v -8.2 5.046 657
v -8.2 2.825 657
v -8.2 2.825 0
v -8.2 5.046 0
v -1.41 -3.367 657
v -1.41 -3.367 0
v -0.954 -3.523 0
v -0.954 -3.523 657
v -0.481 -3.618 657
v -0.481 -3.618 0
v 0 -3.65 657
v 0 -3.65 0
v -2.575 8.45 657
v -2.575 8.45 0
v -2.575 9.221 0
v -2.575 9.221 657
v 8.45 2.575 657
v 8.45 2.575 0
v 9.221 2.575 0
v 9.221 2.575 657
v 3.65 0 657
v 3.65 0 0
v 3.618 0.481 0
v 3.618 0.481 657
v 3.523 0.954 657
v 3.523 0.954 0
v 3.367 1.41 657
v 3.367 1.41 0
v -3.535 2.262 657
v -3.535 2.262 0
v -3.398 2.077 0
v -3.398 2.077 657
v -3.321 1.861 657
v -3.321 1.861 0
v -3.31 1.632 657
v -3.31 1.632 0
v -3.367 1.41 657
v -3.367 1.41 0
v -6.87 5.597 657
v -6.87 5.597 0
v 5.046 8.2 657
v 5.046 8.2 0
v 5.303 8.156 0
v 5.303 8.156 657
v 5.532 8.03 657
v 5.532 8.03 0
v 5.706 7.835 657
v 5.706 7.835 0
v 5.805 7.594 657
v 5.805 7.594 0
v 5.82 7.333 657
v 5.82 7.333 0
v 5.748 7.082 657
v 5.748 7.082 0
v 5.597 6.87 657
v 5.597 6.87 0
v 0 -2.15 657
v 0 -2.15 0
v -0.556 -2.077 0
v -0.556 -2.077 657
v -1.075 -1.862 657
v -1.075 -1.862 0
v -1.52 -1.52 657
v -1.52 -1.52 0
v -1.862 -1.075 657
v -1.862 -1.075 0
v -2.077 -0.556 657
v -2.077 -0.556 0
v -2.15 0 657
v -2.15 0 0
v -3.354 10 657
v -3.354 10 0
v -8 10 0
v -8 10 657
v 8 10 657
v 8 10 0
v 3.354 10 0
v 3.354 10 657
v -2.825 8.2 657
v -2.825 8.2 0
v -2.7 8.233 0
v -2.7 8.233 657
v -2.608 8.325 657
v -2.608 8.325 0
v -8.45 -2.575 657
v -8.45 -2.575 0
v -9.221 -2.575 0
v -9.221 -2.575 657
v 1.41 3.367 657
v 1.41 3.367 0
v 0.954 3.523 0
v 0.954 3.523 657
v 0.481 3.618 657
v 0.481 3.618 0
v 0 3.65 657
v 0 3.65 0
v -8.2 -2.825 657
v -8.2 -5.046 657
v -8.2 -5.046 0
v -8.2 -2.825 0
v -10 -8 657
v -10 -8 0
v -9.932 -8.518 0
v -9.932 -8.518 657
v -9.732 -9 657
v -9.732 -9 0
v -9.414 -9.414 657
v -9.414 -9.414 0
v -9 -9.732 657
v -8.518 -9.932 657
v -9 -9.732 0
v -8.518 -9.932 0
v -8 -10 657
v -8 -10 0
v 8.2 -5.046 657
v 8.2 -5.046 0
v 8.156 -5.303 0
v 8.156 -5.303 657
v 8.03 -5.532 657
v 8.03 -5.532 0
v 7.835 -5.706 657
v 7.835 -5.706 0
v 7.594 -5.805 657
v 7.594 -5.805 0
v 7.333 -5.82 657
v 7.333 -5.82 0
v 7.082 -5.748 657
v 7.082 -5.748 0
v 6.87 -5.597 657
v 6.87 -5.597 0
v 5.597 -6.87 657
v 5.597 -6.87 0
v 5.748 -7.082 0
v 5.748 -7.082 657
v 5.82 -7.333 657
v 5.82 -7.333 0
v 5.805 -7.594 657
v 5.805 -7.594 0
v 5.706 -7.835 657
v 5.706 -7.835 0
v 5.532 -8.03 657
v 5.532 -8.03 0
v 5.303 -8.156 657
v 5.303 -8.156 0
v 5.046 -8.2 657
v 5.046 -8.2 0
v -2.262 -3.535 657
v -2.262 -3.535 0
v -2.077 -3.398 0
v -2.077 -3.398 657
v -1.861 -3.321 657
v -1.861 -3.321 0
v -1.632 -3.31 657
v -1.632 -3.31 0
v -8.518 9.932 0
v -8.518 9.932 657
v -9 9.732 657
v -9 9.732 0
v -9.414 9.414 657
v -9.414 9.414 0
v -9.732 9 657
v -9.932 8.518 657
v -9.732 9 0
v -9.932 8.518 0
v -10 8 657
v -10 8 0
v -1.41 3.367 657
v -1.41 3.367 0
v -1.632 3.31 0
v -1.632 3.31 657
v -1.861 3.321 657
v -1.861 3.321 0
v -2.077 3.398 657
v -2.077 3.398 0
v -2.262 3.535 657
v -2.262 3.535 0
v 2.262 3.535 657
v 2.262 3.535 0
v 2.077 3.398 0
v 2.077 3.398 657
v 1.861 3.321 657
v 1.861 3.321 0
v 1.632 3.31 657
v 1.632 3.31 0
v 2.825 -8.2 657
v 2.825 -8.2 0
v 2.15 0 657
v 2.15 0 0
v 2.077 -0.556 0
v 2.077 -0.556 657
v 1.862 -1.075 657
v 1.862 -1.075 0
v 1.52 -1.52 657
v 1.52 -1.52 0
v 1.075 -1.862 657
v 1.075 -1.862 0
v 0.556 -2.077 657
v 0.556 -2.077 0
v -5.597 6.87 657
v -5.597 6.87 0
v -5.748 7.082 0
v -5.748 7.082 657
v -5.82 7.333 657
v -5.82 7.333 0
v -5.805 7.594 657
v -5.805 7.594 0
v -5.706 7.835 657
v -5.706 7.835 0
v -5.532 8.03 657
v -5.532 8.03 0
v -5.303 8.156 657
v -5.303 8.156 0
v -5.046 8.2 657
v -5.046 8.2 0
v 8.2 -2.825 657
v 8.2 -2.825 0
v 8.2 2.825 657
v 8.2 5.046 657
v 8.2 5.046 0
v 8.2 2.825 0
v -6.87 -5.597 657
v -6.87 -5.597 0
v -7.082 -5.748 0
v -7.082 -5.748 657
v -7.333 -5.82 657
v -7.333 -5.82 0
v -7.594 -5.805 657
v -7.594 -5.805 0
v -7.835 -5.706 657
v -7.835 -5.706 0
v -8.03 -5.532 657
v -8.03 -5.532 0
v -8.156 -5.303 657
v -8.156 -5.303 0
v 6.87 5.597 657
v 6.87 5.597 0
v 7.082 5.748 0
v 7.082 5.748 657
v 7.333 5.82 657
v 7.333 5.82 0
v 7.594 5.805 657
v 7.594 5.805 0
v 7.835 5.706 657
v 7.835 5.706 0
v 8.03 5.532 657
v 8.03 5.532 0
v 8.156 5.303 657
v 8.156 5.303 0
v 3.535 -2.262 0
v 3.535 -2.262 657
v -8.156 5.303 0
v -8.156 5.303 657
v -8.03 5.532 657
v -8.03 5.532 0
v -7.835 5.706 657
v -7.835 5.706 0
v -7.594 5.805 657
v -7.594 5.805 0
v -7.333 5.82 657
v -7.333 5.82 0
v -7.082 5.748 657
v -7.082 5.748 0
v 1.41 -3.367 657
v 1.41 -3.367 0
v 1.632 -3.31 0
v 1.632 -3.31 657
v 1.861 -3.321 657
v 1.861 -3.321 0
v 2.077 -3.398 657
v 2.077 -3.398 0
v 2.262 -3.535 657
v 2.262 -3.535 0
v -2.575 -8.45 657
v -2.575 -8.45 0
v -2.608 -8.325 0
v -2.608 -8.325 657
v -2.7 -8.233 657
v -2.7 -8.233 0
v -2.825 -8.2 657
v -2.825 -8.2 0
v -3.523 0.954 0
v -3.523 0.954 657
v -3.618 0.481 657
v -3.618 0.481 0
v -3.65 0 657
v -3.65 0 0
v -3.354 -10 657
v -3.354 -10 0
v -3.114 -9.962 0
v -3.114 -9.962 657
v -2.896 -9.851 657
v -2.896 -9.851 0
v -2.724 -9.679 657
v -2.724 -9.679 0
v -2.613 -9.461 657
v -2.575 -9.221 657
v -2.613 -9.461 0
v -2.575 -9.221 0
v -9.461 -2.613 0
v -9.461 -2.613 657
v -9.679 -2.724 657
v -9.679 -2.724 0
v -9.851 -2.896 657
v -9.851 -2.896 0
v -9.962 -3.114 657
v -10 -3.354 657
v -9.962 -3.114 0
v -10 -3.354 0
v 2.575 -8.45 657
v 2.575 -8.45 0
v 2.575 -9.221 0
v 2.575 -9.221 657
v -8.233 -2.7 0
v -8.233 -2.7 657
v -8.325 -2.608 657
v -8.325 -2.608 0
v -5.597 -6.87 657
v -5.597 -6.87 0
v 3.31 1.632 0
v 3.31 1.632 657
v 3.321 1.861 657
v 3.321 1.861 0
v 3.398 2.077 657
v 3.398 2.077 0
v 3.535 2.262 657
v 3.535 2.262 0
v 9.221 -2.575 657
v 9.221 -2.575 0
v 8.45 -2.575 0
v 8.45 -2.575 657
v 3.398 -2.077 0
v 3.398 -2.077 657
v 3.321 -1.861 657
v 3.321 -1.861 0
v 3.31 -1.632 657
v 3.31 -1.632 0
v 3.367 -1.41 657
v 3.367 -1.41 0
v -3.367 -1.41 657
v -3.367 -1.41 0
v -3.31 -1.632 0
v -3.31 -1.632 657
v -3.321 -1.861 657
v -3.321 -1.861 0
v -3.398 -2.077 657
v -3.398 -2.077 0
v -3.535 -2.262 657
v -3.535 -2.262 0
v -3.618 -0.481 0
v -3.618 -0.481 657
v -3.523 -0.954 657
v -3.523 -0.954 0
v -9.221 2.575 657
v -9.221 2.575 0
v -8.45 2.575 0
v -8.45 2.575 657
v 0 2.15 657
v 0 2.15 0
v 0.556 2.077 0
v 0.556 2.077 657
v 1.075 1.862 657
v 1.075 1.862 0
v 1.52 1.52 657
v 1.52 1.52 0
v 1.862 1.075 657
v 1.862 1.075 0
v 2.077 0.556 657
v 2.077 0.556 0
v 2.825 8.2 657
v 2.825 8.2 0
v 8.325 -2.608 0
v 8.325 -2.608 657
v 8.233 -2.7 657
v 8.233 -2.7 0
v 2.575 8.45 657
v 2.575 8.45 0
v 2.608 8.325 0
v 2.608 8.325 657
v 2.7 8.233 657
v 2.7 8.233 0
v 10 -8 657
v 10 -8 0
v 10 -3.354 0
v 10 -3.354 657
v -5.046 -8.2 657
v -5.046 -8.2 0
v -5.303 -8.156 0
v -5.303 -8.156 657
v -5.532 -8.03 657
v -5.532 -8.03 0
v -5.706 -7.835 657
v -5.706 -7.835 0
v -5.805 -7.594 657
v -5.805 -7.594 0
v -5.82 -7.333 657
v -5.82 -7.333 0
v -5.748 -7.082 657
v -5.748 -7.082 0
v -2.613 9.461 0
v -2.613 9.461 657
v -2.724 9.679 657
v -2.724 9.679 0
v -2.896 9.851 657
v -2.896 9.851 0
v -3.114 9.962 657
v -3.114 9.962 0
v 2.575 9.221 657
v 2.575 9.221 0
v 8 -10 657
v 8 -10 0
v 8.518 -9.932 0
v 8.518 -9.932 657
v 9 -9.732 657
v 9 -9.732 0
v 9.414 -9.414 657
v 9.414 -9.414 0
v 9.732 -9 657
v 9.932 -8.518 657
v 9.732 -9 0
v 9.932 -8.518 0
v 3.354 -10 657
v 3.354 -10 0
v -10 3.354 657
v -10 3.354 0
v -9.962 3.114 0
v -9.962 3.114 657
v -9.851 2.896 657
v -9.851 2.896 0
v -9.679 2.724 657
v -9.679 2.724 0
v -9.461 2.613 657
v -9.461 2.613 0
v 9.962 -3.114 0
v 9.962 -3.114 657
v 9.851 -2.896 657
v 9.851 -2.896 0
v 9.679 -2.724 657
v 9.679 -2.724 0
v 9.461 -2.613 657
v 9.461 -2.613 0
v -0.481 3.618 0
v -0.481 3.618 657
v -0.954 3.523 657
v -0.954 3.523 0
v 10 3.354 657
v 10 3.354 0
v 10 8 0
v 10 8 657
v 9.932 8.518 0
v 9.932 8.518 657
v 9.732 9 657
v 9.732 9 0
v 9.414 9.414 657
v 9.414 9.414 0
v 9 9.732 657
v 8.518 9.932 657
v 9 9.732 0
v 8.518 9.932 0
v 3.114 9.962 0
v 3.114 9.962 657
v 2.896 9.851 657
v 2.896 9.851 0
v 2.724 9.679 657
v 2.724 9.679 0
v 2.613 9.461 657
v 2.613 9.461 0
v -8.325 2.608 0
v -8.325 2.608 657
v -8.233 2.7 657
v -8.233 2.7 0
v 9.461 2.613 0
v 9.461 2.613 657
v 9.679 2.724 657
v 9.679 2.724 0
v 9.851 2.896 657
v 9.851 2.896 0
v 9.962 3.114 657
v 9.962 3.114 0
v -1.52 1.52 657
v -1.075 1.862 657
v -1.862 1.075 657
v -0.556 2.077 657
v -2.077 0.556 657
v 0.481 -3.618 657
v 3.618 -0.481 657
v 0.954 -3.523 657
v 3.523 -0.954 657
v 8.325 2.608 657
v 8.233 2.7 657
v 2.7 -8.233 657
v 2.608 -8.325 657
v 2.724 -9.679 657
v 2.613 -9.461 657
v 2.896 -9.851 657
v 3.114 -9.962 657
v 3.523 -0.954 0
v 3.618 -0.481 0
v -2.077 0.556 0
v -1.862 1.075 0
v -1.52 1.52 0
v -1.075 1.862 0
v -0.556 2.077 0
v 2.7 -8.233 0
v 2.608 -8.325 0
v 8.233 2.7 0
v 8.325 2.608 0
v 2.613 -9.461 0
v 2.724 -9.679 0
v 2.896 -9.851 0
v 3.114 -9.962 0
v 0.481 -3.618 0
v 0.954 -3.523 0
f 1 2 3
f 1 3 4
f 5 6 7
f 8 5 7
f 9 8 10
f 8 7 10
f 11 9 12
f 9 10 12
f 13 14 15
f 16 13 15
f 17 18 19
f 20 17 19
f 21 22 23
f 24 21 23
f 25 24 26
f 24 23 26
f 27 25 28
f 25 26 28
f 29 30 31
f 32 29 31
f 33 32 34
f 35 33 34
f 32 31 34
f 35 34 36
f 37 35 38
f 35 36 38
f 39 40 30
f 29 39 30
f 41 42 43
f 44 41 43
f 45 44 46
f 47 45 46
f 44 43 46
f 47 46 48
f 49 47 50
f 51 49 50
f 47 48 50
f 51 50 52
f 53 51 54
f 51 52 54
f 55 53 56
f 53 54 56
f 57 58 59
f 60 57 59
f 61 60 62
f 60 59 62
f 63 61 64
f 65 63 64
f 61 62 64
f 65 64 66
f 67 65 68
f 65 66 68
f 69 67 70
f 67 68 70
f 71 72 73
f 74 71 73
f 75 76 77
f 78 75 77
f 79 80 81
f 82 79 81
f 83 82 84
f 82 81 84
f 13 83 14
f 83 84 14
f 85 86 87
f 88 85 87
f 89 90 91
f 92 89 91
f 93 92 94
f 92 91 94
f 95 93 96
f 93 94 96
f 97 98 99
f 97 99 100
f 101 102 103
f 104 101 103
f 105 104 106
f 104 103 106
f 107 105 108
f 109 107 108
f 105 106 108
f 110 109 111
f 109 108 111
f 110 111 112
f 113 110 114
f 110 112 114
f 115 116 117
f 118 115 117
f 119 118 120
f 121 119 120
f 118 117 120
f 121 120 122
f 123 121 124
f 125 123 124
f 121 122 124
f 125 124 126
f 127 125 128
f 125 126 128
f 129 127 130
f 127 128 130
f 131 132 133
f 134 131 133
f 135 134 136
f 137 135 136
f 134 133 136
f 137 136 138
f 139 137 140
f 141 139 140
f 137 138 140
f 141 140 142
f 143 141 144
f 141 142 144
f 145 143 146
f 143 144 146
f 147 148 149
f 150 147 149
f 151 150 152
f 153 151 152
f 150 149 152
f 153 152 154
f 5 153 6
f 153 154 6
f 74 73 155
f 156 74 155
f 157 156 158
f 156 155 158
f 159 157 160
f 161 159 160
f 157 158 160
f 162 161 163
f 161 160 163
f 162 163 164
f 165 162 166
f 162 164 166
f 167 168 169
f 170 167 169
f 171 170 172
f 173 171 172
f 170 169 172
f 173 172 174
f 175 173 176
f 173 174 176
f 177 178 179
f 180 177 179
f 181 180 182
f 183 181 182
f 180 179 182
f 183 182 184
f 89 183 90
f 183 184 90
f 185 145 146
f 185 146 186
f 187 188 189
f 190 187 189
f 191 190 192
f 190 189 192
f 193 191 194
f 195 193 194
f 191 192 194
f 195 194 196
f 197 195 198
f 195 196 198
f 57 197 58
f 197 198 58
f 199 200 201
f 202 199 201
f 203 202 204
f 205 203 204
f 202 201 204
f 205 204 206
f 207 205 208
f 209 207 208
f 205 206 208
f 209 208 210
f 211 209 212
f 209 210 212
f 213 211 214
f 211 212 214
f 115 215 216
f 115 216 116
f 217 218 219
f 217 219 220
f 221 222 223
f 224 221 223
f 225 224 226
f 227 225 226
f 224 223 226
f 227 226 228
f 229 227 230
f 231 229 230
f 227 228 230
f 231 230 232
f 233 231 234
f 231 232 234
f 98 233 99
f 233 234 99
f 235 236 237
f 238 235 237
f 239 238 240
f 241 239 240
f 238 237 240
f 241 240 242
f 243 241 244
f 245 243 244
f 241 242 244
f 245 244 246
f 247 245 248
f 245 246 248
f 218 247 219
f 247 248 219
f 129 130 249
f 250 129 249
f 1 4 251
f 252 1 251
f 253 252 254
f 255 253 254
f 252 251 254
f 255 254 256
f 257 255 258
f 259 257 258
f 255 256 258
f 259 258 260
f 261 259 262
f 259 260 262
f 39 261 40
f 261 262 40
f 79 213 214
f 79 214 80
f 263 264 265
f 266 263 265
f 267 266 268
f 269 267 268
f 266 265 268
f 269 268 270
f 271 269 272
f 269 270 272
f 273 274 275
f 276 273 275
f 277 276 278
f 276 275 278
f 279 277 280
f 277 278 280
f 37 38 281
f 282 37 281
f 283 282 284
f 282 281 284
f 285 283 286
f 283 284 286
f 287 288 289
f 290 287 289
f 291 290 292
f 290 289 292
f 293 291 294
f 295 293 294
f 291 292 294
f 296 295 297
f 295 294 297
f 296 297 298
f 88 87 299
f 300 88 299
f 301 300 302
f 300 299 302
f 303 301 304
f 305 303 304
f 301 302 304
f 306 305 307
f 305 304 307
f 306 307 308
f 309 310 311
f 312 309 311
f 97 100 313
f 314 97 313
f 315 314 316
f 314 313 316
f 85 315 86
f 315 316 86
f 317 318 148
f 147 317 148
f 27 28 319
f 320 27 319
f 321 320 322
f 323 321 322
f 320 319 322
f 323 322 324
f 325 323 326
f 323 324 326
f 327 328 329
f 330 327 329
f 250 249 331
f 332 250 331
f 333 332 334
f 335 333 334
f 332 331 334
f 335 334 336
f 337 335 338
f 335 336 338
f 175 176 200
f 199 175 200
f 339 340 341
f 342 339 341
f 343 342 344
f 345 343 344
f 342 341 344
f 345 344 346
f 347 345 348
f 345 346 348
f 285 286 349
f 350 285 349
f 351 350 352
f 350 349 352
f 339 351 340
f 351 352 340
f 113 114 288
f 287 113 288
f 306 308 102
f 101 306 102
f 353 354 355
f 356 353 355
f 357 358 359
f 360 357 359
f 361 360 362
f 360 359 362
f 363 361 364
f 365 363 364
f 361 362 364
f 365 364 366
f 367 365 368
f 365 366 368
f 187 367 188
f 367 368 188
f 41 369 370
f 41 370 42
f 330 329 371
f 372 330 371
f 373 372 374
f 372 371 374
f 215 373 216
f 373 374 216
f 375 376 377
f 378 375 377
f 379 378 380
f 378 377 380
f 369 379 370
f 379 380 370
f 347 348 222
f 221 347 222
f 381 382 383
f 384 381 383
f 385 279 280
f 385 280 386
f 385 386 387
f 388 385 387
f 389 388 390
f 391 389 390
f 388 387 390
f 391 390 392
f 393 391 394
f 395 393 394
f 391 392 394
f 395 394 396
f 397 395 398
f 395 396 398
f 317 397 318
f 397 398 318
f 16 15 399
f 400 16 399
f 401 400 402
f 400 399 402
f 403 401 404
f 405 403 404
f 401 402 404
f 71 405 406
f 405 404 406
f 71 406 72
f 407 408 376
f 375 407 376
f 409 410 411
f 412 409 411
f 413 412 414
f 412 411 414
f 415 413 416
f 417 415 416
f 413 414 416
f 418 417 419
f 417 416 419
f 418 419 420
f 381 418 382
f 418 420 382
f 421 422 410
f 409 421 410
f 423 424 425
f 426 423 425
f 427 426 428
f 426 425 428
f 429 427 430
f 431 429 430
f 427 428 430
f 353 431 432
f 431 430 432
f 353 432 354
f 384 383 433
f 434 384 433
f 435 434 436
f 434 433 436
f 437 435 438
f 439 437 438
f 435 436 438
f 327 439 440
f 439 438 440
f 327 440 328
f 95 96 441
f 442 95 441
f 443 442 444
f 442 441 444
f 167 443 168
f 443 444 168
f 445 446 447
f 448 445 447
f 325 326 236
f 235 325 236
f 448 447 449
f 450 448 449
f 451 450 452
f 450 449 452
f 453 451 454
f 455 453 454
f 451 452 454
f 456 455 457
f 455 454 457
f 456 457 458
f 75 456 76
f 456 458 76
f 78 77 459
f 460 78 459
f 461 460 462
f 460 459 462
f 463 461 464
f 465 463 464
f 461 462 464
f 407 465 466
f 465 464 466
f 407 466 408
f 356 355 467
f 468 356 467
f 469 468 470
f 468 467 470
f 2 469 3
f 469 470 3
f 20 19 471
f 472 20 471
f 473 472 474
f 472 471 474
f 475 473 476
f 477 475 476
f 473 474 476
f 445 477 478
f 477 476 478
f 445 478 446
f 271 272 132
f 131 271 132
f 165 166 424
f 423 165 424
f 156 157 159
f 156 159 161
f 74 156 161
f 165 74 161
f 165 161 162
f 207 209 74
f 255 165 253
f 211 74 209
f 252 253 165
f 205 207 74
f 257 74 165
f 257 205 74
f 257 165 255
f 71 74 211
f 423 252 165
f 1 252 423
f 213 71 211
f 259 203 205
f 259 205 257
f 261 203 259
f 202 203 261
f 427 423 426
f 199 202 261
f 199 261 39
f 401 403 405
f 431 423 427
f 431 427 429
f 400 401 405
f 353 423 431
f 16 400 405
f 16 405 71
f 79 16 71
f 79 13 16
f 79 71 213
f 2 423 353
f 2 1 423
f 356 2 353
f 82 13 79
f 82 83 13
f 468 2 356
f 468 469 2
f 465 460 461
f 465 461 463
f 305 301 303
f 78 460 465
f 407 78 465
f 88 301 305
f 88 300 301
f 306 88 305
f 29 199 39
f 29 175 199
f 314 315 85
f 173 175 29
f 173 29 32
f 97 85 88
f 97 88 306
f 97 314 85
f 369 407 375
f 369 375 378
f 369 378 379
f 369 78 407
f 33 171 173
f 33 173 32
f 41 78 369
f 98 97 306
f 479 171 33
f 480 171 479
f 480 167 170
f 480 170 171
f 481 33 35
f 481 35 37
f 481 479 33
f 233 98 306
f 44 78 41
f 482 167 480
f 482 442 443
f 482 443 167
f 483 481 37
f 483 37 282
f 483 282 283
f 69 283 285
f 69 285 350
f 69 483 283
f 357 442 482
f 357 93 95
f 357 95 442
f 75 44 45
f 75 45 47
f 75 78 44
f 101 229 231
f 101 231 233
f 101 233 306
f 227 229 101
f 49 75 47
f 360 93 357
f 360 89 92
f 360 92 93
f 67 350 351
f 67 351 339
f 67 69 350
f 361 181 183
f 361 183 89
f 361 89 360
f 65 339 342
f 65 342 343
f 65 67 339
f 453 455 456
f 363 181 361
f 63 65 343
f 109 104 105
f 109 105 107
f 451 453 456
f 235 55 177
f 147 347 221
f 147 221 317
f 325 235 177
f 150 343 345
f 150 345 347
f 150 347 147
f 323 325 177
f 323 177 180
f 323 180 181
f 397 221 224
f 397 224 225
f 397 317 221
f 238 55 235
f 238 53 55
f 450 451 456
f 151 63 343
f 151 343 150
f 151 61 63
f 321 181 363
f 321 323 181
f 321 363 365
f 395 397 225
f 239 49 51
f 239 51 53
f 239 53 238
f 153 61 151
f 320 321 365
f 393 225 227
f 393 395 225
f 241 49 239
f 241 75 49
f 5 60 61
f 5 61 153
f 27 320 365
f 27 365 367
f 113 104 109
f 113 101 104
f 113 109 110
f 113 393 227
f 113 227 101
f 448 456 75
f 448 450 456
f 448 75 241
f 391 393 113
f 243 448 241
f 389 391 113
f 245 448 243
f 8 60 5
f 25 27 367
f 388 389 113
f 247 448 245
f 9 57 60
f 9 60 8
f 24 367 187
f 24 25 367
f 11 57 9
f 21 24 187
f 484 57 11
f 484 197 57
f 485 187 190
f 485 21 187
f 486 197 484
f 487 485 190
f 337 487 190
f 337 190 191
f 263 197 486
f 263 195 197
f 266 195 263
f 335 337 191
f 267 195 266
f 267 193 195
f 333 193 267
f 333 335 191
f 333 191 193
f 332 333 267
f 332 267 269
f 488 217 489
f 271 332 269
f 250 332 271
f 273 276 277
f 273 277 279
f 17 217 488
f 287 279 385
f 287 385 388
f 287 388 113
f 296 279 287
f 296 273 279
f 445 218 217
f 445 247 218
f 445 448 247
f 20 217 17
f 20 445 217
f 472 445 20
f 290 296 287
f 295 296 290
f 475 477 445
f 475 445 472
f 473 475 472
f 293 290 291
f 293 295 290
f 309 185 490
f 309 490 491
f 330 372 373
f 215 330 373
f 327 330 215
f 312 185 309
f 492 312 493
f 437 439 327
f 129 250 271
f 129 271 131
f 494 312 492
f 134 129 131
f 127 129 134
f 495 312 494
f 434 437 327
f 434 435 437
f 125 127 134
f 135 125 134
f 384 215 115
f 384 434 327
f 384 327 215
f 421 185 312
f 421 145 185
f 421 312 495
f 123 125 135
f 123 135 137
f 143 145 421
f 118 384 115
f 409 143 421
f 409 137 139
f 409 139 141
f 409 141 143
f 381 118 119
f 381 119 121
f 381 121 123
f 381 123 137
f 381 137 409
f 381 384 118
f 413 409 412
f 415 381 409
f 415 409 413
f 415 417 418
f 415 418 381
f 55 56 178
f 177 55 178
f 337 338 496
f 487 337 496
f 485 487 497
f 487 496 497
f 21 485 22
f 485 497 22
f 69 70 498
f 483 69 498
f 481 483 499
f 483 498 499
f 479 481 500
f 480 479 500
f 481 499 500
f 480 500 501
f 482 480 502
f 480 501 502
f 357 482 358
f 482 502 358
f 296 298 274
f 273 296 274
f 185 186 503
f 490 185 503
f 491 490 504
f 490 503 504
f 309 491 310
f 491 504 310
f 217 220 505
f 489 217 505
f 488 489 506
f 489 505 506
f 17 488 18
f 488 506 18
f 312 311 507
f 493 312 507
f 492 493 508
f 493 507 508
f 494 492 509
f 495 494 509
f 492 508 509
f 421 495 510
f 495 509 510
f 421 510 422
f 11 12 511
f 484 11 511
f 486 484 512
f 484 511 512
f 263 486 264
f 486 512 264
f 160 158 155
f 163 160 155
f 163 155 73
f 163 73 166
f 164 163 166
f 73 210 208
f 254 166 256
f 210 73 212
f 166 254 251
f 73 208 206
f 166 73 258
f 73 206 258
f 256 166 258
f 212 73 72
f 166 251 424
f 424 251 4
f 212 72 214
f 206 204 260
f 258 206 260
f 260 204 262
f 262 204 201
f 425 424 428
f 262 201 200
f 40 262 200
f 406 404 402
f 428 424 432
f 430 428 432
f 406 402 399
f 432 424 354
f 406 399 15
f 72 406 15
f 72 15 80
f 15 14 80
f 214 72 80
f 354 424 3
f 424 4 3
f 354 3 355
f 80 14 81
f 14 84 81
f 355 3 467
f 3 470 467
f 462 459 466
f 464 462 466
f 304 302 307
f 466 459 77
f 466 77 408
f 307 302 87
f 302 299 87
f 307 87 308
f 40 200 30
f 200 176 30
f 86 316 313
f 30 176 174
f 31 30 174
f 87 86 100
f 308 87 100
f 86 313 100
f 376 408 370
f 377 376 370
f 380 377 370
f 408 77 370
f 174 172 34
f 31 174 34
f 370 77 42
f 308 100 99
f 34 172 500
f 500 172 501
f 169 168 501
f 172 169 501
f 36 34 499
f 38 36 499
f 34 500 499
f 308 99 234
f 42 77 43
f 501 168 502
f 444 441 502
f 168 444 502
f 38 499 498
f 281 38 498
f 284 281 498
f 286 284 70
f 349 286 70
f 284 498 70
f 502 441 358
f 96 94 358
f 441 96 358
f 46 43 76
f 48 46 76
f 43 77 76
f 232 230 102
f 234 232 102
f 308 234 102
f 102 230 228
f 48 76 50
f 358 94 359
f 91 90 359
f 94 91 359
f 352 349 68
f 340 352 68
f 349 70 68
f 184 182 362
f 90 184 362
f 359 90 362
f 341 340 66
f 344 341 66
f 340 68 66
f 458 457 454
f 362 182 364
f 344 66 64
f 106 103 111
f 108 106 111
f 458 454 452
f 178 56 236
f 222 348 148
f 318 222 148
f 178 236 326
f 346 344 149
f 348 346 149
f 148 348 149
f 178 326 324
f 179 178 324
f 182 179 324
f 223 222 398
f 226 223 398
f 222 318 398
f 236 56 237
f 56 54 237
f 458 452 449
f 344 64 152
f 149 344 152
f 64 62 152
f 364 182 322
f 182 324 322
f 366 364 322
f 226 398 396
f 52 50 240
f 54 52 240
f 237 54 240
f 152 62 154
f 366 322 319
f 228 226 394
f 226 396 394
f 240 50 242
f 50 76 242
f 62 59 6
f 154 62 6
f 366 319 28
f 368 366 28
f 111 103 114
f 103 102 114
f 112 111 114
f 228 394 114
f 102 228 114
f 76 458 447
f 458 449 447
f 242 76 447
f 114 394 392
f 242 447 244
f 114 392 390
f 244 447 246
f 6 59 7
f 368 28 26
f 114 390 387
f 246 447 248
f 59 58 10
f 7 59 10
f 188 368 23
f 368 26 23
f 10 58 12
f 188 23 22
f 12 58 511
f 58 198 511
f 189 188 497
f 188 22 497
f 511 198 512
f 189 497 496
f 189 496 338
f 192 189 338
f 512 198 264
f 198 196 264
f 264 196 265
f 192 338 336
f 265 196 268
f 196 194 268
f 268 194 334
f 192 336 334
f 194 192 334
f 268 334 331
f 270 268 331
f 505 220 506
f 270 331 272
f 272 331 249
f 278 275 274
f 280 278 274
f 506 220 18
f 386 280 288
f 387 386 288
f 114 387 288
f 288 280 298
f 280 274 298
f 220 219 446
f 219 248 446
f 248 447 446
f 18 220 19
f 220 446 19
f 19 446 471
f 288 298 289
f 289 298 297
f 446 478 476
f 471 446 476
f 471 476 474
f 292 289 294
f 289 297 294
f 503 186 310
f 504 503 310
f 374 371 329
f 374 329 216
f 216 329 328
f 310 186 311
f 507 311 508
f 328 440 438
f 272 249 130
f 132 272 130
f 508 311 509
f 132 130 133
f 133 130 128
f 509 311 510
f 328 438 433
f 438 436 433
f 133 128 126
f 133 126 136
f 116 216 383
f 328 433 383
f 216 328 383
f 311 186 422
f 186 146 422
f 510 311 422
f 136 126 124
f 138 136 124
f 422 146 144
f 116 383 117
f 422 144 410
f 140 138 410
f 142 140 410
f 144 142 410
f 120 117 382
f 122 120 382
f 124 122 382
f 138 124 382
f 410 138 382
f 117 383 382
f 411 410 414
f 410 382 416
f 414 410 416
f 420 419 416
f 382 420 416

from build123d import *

# Parameters (mm, degrees)
BOSS_EXTRUDE1_DEPTH = 657
CIRPATTERN1_COUNT   = 4


with BuildPart() as part:
    # Sketch2 → Boss-Extrude1 (new body)
    with BuildSketch(Plane.XY):
        with BuildLine():
            Line((-5.045621395, 8.2), (-2.825, 8.2))
            ThreePointArc((-2.825, 8.2), (-2.648223305, 8.273223305), (-2.575, 8.45))
            Line((-2.575, 8.45), (-2.575, 9.220621395))
            ThreePointArc((-2.575, 9.220621395), (-2.803274708, 9.771725292), (-3.354378605, 10))
            Line((-3.354378605, 10), (-8, 10))
            ThreePointArc((-8, 10), (-9.414213562, 9.414213562), (-10, 8))
            Line((-10, 8), (-10, 3.354378605))
            ThreePointArc((-10, 3.354378605), (-9.771725292, 2.803274708), (-9.220621395, 2.575))
            Line((-9.220621395, 2.575), (-8.45, 2.575))
            ThreePointArc((-8.45, 2.575), (-8.273223305, 2.648223305), (-8.2, 2.825))
            Line((-8.2, 2.825), (-8.2, 5.045621395))
            ThreePointArc((-8.2, 5.045621395), (-7.718876674, 5.765673336), (-6.869517498, 5.596725292))
            Line((-6.869517498, 5.596725292), (-3.534592295, 2.261800088))
            ThreePointArc((-3.534592295, 2.261800088), (-3.321003619, 1.861282645), (-3.366790791, 1.409687827))
            ThreePointArc((-3.366790791, 1.409687827), (-3.578497337, 0.718927539), (-3.65, 0))
            Line((-3.65, 0), (-2.15, 0))
            ThreePointArc((-2.15, 0), (-1.52027958, 1.52027958), (0, 2.15))
            Line((0, 2.15), (0, 3.65))
            ThreePointArc((0, 3.65), (-0.718927539, 3.578497337), (-1.409687827, 3.366790791))
            ThreePointArc((-1.409687827, 3.366790791), (-1.861282645, 3.321003619), (-2.261800088, 3.534592295))
            Line((-2.261800088, 3.534592295), (-5.596725292, 6.869517498))
            ThreePointArc((-5.596725292, 6.869517498), (-5.765673336, 7.718876674), (-5.045621395, 8.2))
        make_face()
    boss_extrude1 = extrude(amount=BOSS_EXTRUDE1_DEPTH)

    # CirPattern1: Boss-Extrude1 ×4 about axis
    cirpattern1_axis = Axis((0, 0, 657), (0, 0, -1))
    for i in range(1, CIRPATTERN1_COUNT):
        add(boss_extrude1.rotate(cirpattern1_axis, i * 360 / CIRPATTERN1_COUNT))


solid = part.part
